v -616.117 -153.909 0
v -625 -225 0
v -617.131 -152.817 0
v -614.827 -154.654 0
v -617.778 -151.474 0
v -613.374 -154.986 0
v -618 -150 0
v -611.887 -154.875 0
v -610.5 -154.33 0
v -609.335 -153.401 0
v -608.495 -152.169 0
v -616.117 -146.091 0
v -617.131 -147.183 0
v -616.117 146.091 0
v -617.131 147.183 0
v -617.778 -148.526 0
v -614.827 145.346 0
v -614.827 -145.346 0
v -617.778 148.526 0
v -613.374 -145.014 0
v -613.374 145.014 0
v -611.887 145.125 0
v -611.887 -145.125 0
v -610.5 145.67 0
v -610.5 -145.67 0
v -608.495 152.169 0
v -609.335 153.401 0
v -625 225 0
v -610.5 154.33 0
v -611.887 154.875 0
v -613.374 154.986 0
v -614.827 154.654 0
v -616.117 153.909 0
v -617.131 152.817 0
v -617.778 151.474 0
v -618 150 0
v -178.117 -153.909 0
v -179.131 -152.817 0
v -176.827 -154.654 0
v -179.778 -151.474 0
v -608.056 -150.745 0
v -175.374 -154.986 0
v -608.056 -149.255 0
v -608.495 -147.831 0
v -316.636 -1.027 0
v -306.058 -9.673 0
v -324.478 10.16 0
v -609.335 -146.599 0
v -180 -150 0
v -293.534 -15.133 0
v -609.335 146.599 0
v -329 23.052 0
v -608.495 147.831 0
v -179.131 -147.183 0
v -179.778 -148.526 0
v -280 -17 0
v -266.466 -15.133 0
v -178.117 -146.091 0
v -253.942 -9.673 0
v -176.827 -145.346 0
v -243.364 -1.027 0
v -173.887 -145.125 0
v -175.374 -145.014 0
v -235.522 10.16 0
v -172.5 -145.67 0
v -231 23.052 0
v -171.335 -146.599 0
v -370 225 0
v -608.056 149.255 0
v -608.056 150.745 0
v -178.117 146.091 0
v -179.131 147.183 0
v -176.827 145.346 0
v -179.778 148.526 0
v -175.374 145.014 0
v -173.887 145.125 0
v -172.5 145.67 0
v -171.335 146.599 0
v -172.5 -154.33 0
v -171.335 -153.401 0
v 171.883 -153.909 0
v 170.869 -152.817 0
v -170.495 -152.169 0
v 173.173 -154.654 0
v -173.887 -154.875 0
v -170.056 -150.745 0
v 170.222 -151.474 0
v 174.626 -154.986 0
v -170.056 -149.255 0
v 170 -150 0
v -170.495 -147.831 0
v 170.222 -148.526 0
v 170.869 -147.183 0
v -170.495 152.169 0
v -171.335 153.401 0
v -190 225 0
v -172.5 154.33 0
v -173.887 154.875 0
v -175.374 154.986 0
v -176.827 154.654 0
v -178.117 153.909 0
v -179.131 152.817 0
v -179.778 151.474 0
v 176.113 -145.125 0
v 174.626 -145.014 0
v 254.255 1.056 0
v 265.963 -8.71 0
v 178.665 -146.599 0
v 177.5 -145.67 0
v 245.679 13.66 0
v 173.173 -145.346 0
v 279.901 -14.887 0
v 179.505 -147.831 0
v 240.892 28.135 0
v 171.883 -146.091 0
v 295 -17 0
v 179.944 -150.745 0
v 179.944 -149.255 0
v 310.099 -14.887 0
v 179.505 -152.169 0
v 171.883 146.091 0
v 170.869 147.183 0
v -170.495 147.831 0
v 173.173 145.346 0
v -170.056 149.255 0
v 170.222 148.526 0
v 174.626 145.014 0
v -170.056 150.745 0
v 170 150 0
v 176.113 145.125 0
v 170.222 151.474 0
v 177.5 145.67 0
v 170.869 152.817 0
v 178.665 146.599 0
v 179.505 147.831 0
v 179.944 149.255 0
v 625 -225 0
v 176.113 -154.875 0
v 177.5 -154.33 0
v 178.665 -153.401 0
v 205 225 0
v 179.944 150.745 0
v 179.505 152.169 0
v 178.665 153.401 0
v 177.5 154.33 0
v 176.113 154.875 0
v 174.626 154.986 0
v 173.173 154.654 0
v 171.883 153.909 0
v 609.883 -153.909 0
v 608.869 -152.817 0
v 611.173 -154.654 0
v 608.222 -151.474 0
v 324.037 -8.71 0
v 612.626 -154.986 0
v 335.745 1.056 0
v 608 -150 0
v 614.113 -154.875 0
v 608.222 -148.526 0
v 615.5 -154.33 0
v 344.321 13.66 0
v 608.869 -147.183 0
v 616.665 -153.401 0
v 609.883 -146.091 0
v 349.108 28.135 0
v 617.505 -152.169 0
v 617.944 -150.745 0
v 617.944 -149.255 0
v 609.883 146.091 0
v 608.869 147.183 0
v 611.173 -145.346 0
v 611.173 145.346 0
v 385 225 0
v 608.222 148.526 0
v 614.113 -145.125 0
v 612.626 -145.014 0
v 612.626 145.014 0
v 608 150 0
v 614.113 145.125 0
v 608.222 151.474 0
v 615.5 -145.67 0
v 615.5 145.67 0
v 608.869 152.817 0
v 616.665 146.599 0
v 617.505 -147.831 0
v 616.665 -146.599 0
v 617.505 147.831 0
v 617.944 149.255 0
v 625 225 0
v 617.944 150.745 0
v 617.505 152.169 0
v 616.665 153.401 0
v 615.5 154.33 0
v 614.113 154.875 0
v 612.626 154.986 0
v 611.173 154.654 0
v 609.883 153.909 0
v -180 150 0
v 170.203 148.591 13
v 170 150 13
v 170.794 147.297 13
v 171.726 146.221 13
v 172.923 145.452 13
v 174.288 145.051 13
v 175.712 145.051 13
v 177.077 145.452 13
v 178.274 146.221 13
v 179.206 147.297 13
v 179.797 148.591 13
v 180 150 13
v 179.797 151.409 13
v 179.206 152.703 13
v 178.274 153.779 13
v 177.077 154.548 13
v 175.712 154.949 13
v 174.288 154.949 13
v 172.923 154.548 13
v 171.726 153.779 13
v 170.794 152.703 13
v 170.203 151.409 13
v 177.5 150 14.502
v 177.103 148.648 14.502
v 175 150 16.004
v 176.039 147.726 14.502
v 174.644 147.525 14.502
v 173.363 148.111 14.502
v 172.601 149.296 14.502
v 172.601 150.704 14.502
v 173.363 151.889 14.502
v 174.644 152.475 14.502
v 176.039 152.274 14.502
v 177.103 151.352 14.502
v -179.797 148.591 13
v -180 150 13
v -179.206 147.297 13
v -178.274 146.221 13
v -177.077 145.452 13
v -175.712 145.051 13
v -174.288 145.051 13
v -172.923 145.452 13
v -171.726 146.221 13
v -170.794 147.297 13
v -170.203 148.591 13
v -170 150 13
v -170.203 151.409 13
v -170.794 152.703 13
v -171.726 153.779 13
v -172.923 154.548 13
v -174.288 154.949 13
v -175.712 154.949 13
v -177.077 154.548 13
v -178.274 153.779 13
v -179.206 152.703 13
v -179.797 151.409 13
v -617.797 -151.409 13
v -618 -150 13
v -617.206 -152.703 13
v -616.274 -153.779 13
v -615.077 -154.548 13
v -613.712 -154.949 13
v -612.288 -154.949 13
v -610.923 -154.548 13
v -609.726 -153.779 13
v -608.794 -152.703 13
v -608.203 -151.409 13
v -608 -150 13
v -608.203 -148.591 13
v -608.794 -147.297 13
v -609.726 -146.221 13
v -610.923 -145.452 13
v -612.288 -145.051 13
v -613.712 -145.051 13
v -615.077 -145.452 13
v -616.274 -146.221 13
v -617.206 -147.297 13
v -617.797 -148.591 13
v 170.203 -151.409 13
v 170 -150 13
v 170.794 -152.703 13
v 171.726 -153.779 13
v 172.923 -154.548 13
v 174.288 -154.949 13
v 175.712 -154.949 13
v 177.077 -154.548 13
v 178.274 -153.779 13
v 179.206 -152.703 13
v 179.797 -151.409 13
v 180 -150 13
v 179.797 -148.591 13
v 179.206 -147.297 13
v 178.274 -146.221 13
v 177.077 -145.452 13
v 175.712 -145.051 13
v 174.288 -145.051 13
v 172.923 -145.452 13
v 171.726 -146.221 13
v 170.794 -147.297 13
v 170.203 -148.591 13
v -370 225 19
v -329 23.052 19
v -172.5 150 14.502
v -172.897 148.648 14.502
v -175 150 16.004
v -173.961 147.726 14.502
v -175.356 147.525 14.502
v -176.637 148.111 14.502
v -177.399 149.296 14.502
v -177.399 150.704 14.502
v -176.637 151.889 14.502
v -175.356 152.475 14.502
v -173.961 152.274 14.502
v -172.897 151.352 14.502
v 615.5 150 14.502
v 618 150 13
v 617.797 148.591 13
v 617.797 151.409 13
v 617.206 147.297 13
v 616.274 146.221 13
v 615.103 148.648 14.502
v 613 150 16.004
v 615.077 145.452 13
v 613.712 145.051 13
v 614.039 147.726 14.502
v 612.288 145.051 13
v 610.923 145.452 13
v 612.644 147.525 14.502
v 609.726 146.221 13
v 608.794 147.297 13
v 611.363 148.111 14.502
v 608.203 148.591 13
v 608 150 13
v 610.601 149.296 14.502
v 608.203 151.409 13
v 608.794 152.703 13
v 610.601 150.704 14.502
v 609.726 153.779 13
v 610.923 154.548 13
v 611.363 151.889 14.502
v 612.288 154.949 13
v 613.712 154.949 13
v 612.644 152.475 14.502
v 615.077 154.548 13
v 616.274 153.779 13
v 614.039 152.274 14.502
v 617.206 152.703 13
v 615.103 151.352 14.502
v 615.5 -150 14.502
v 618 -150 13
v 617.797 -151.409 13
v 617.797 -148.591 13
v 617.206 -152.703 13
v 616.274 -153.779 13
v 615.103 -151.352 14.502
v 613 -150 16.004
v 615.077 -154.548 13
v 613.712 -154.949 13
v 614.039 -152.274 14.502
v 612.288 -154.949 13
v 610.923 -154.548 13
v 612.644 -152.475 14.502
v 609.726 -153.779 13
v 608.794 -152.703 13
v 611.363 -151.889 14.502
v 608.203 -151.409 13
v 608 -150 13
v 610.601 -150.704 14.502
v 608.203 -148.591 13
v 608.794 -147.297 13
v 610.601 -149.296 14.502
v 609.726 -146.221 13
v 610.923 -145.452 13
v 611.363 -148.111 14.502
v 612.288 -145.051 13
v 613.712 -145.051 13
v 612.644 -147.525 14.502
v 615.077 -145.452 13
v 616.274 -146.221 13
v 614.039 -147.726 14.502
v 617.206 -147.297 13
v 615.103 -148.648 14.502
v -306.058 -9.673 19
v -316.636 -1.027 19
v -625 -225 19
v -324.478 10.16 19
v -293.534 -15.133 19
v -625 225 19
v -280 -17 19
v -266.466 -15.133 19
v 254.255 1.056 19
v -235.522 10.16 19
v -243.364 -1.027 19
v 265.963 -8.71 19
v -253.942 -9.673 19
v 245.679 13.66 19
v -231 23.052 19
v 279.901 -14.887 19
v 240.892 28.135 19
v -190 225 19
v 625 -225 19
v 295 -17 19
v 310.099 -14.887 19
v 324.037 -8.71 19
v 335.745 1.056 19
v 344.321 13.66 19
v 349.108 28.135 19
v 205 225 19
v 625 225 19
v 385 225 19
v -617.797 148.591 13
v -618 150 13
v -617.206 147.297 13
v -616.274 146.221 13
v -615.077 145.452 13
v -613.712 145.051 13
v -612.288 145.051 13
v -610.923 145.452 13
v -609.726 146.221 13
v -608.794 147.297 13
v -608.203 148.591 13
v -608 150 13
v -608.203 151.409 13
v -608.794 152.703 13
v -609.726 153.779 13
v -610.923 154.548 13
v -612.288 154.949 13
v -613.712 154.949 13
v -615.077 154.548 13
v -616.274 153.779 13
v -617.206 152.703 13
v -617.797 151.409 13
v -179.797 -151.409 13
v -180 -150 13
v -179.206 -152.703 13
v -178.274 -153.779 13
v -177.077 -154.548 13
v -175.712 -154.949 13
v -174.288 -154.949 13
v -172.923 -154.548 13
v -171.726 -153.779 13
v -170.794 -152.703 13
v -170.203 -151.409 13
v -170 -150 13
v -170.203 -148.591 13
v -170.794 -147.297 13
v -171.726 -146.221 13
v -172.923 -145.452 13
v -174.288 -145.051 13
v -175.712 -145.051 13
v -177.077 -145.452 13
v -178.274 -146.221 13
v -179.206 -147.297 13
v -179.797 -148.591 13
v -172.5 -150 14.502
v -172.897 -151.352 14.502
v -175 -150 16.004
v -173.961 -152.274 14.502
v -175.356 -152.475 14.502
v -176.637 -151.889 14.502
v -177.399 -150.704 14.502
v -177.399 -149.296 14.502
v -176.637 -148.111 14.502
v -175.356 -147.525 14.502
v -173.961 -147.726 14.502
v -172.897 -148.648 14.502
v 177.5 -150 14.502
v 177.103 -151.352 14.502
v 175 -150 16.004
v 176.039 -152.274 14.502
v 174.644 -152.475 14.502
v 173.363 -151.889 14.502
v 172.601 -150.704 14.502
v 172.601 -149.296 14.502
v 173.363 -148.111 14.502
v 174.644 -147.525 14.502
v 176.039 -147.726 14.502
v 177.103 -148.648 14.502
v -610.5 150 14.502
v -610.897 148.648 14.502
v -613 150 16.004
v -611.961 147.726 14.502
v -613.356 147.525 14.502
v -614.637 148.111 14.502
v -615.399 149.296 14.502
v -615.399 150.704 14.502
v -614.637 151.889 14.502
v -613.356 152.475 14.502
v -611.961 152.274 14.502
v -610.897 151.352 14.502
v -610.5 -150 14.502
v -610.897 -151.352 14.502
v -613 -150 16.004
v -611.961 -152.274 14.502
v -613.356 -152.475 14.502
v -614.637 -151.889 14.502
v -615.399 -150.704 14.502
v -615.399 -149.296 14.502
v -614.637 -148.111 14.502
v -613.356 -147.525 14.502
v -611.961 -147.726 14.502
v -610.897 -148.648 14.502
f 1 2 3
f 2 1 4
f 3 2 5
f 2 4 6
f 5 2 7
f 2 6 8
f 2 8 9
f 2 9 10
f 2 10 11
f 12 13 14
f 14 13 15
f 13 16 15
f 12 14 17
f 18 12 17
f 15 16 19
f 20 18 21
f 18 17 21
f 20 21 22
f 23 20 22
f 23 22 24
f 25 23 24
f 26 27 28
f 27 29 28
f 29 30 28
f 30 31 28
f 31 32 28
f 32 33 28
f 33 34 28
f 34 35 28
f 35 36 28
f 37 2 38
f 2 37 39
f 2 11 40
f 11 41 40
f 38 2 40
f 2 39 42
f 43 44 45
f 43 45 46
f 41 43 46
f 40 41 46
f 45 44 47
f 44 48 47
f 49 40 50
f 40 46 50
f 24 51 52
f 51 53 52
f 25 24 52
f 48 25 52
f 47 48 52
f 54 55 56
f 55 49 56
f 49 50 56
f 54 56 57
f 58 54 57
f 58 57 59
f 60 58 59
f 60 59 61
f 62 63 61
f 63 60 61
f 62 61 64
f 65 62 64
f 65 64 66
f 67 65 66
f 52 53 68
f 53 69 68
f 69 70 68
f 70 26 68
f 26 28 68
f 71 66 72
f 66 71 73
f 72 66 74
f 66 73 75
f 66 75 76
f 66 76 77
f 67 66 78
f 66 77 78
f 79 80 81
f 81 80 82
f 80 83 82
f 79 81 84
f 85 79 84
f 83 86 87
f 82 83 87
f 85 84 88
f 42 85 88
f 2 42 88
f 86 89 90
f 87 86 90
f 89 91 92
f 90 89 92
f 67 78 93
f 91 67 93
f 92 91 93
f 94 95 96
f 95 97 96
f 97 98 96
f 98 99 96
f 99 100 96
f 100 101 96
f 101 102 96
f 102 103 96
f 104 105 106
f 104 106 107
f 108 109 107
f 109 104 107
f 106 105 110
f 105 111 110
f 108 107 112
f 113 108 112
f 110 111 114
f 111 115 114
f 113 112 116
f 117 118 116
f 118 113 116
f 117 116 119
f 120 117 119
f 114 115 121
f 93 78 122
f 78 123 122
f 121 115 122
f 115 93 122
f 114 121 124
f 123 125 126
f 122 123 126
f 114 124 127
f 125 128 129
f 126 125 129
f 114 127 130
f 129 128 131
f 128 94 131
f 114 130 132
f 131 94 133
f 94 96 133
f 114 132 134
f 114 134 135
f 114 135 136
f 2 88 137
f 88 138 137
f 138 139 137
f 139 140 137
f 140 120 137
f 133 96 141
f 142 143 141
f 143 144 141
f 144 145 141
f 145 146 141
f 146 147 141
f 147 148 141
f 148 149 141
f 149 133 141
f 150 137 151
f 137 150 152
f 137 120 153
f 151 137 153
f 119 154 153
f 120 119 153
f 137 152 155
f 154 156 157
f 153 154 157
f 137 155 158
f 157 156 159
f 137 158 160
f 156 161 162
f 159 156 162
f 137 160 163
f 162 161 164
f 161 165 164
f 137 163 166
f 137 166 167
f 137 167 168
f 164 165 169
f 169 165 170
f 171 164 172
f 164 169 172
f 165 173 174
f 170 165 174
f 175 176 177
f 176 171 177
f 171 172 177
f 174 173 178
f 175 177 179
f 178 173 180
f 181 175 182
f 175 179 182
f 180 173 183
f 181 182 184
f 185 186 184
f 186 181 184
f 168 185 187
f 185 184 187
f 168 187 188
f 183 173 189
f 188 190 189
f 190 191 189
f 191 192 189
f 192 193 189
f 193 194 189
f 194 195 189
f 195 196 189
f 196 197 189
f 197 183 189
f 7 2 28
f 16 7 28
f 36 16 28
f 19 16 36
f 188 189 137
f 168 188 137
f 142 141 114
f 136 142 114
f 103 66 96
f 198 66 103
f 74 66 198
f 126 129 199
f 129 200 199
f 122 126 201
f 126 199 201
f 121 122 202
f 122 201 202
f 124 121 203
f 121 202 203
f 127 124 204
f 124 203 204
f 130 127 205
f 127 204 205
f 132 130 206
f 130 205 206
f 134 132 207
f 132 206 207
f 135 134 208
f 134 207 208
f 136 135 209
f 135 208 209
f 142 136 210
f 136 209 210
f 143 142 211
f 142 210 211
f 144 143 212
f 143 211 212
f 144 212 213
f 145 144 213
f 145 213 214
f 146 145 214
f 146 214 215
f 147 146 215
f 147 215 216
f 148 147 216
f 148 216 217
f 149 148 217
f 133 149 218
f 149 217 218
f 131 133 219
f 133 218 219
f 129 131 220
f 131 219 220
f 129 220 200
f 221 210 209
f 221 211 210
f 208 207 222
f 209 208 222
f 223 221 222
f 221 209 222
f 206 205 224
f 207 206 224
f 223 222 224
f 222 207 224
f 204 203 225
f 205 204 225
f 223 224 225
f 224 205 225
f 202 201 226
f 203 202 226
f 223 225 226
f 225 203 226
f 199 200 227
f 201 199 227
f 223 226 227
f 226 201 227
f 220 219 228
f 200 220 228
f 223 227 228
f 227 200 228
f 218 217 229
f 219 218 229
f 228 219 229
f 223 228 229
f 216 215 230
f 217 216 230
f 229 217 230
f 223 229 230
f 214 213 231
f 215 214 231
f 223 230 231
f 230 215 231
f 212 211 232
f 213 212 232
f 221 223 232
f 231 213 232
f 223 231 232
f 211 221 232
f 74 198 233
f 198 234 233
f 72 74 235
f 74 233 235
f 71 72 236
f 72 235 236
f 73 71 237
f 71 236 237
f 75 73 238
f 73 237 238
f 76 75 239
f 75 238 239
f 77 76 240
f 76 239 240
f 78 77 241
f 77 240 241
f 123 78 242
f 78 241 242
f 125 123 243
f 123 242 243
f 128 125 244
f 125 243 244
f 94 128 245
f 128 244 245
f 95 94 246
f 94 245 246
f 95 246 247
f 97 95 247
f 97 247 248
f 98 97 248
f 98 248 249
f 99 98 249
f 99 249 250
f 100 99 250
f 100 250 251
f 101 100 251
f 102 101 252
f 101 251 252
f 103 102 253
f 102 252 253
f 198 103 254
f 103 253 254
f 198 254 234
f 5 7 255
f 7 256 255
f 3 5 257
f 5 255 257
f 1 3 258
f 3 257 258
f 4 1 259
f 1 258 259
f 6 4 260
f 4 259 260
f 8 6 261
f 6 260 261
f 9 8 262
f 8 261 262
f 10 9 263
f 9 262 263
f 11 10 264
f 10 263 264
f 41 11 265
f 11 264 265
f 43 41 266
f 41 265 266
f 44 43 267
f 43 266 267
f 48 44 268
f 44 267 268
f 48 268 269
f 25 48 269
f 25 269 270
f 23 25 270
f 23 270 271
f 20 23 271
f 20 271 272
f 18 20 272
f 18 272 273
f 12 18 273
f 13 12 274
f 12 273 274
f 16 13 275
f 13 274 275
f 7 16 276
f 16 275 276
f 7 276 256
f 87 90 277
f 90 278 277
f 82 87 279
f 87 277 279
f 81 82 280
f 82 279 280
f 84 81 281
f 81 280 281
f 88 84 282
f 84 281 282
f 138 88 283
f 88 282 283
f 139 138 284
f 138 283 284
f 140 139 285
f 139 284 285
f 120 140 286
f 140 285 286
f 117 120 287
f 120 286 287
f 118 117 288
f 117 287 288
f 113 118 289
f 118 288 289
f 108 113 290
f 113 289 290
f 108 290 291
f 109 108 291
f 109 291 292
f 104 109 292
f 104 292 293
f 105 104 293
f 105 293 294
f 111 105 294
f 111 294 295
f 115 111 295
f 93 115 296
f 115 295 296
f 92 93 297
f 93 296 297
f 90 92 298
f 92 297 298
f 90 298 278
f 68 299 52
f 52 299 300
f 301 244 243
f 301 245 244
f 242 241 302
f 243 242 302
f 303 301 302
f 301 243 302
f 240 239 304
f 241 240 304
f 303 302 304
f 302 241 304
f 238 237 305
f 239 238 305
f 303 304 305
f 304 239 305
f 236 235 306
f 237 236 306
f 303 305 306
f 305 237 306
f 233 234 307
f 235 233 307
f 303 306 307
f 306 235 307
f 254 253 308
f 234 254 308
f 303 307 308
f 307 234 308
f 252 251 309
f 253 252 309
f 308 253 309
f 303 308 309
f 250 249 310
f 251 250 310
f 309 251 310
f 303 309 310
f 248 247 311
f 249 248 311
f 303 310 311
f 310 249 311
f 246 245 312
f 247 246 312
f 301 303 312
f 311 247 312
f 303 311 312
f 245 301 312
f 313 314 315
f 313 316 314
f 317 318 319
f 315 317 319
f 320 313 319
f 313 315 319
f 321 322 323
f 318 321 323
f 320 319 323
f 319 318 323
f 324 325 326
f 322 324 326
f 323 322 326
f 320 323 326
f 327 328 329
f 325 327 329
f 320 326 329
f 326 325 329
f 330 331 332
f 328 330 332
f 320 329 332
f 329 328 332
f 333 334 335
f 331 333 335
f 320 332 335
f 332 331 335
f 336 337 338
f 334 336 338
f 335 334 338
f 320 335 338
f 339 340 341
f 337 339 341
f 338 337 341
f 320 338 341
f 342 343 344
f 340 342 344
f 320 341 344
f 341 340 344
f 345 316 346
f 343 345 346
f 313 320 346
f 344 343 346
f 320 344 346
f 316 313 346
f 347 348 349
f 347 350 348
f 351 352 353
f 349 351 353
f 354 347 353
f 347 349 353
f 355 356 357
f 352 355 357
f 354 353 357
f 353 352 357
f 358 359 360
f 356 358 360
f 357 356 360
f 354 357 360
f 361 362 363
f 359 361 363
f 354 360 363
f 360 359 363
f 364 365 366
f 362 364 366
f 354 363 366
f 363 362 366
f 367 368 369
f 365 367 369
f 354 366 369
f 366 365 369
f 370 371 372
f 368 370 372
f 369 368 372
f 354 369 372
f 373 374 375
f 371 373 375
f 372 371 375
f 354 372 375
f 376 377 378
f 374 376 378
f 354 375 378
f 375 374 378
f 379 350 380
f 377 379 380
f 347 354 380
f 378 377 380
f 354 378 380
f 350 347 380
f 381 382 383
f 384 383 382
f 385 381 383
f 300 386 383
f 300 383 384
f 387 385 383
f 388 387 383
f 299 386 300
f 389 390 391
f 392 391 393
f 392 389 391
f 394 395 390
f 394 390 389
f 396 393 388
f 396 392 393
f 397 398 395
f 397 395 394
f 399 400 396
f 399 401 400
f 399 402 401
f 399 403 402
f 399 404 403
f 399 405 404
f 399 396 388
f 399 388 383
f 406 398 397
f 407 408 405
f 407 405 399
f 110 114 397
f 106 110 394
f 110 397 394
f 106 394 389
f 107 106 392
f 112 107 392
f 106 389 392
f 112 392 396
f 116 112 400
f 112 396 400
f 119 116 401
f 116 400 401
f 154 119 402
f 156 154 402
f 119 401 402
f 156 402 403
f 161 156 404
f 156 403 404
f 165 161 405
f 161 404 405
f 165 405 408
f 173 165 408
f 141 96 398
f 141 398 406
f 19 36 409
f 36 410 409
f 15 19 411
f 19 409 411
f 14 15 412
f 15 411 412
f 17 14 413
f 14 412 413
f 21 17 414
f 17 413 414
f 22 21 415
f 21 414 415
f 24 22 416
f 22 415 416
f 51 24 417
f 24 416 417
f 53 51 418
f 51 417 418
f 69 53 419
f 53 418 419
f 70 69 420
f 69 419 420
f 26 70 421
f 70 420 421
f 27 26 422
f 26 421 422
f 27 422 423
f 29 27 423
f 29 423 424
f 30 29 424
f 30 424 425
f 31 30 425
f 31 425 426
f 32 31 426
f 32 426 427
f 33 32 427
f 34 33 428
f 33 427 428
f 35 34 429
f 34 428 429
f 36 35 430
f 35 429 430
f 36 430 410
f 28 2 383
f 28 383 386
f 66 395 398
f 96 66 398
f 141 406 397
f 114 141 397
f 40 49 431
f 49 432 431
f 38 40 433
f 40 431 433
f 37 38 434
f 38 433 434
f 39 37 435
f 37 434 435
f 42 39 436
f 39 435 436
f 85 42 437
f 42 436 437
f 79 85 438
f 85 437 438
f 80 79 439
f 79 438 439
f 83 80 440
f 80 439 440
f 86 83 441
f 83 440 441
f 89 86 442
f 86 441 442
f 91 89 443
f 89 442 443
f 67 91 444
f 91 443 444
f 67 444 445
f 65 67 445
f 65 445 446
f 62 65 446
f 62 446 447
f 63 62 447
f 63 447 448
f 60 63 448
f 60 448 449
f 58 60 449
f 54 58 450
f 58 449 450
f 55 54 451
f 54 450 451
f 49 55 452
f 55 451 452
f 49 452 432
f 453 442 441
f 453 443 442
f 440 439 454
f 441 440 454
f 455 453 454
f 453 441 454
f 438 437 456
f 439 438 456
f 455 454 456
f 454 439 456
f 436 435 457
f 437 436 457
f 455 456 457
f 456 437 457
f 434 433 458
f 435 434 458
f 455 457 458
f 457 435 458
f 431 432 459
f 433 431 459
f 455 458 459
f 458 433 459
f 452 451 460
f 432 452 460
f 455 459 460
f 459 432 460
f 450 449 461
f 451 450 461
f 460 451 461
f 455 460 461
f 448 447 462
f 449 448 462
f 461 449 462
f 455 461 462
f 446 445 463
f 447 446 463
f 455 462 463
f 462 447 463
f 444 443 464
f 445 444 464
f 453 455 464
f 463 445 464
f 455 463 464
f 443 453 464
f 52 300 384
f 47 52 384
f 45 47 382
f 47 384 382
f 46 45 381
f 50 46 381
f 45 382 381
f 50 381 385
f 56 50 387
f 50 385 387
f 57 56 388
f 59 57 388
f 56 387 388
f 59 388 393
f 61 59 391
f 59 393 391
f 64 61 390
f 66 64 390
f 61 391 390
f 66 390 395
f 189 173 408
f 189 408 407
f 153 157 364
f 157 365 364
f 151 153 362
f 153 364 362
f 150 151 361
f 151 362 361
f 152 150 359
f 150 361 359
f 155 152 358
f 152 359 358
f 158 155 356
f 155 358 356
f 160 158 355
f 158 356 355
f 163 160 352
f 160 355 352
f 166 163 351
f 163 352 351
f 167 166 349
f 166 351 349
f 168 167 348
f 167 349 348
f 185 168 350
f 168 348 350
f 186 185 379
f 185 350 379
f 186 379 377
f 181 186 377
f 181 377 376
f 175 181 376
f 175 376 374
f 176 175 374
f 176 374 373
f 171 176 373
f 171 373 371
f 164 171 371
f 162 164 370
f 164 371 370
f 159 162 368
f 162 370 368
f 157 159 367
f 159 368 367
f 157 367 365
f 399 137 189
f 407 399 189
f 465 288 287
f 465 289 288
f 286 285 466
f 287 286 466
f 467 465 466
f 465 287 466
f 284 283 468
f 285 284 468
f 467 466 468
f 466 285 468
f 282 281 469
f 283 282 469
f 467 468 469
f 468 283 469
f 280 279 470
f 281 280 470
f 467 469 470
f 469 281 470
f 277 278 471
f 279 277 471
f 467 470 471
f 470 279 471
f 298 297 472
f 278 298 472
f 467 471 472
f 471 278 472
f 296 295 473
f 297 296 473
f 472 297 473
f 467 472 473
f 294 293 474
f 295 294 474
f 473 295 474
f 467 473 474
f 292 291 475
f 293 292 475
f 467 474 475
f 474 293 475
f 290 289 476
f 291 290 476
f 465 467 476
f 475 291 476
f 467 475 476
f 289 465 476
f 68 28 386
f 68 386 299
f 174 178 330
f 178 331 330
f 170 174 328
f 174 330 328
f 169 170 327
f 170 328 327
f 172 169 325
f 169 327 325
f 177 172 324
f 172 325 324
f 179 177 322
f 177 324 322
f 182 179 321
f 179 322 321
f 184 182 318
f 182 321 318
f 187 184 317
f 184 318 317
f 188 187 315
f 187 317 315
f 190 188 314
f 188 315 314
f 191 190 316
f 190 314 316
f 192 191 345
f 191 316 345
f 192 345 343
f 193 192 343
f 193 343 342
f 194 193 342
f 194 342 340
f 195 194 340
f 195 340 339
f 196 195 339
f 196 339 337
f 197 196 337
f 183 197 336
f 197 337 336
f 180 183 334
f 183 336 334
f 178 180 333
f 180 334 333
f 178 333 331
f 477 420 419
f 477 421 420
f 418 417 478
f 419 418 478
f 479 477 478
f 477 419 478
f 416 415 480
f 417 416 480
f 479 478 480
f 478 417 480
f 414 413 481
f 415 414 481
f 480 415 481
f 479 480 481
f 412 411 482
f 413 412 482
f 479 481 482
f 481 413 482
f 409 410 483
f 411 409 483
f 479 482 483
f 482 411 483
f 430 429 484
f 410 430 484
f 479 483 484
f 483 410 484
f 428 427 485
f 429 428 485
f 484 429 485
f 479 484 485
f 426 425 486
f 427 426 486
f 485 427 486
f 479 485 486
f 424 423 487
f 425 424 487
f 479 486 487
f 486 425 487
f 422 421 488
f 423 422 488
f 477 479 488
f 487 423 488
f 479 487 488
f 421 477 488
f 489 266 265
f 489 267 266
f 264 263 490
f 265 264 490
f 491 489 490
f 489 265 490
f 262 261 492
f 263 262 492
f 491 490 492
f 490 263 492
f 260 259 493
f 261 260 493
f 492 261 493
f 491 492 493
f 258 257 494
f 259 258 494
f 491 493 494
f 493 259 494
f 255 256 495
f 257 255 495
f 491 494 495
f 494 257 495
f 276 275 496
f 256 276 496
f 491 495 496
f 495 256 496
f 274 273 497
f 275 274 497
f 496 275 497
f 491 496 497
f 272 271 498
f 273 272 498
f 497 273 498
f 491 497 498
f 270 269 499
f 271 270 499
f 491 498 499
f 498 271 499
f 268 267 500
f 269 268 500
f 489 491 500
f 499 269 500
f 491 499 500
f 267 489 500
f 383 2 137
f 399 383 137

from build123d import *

# Parameters (mm, degrees)
F0_W     = 1250
F0_H     = 450
F1_DEPTH = 19
F3_DEPTH = 19
F5_DEPTH = 19
F7_D     = 10
F7_DEPTH = 13
F7_TIP   = 3.0043030951


with BuildPart() as f1:
    # F0 (on Top) → F1 (new body)
    with BuildSketch(Plane.XY):
        Rectangle(F0_W, F0_H)
    extrude(amount=F1_DEPTH)

    # F2 (on face) → F3 (cut, through all)
    with BuildSketch(Plane.XY.offset(19)):
        with BuildLine():
            Line((-190, 225), (-370, 225))
            Line((-370, 225), (-329.0003629481, 23.0519132014))
            ThreePointArc((-329.0003629481, 23.0519132014), (-280, -17), (-230.9996370519, 23.0519132014))
            Line((-230.9996370519, 23.0519132014), (-190, 225))
        make_face()
    extrude(amount=-F3_DEPTH, mode=Mode.SUBTRACT)

    # F4 (on face) → F5 (cut, through all)
    with BuildSketch(Plane.XY.offset(19)):
        with BuildLine():
            Line((385, 225), (205, 225))
            Line((205, 225), (240.8919167139, 28.1351470815))
            ThreePointArc((240.8919167139, 28.1351470815), (295, -17), (349.1080832861, 28.1351470815))
            Line((349.1080832861, 28.1351470815), (385, 225))
        make_face()
    extrude(amount=-F5_DEPTH, mode=Mode.SUBTRACT)

    # F7
    with Locations(Plane(origin=(0, 0, 0), x_dir=(1, 0, 0), z_dir=(0, 0, -1))):
        with Locations((-613, 150), (-175, 150), (175, 150), (613, 150), (-613, -150), (-175, -150), (175, -150), (613, -150)):
            Hole(F7_D / 2, depth=F7_DEPTH)
            with Locations((0, 0, -(F7_DEPTH + F7_TIP / 2))):  # 118° drill point
                Cone(0, F7_D / 2, F7_TIP, mode=Mode.SUBTRACT)


solid = f1.part
